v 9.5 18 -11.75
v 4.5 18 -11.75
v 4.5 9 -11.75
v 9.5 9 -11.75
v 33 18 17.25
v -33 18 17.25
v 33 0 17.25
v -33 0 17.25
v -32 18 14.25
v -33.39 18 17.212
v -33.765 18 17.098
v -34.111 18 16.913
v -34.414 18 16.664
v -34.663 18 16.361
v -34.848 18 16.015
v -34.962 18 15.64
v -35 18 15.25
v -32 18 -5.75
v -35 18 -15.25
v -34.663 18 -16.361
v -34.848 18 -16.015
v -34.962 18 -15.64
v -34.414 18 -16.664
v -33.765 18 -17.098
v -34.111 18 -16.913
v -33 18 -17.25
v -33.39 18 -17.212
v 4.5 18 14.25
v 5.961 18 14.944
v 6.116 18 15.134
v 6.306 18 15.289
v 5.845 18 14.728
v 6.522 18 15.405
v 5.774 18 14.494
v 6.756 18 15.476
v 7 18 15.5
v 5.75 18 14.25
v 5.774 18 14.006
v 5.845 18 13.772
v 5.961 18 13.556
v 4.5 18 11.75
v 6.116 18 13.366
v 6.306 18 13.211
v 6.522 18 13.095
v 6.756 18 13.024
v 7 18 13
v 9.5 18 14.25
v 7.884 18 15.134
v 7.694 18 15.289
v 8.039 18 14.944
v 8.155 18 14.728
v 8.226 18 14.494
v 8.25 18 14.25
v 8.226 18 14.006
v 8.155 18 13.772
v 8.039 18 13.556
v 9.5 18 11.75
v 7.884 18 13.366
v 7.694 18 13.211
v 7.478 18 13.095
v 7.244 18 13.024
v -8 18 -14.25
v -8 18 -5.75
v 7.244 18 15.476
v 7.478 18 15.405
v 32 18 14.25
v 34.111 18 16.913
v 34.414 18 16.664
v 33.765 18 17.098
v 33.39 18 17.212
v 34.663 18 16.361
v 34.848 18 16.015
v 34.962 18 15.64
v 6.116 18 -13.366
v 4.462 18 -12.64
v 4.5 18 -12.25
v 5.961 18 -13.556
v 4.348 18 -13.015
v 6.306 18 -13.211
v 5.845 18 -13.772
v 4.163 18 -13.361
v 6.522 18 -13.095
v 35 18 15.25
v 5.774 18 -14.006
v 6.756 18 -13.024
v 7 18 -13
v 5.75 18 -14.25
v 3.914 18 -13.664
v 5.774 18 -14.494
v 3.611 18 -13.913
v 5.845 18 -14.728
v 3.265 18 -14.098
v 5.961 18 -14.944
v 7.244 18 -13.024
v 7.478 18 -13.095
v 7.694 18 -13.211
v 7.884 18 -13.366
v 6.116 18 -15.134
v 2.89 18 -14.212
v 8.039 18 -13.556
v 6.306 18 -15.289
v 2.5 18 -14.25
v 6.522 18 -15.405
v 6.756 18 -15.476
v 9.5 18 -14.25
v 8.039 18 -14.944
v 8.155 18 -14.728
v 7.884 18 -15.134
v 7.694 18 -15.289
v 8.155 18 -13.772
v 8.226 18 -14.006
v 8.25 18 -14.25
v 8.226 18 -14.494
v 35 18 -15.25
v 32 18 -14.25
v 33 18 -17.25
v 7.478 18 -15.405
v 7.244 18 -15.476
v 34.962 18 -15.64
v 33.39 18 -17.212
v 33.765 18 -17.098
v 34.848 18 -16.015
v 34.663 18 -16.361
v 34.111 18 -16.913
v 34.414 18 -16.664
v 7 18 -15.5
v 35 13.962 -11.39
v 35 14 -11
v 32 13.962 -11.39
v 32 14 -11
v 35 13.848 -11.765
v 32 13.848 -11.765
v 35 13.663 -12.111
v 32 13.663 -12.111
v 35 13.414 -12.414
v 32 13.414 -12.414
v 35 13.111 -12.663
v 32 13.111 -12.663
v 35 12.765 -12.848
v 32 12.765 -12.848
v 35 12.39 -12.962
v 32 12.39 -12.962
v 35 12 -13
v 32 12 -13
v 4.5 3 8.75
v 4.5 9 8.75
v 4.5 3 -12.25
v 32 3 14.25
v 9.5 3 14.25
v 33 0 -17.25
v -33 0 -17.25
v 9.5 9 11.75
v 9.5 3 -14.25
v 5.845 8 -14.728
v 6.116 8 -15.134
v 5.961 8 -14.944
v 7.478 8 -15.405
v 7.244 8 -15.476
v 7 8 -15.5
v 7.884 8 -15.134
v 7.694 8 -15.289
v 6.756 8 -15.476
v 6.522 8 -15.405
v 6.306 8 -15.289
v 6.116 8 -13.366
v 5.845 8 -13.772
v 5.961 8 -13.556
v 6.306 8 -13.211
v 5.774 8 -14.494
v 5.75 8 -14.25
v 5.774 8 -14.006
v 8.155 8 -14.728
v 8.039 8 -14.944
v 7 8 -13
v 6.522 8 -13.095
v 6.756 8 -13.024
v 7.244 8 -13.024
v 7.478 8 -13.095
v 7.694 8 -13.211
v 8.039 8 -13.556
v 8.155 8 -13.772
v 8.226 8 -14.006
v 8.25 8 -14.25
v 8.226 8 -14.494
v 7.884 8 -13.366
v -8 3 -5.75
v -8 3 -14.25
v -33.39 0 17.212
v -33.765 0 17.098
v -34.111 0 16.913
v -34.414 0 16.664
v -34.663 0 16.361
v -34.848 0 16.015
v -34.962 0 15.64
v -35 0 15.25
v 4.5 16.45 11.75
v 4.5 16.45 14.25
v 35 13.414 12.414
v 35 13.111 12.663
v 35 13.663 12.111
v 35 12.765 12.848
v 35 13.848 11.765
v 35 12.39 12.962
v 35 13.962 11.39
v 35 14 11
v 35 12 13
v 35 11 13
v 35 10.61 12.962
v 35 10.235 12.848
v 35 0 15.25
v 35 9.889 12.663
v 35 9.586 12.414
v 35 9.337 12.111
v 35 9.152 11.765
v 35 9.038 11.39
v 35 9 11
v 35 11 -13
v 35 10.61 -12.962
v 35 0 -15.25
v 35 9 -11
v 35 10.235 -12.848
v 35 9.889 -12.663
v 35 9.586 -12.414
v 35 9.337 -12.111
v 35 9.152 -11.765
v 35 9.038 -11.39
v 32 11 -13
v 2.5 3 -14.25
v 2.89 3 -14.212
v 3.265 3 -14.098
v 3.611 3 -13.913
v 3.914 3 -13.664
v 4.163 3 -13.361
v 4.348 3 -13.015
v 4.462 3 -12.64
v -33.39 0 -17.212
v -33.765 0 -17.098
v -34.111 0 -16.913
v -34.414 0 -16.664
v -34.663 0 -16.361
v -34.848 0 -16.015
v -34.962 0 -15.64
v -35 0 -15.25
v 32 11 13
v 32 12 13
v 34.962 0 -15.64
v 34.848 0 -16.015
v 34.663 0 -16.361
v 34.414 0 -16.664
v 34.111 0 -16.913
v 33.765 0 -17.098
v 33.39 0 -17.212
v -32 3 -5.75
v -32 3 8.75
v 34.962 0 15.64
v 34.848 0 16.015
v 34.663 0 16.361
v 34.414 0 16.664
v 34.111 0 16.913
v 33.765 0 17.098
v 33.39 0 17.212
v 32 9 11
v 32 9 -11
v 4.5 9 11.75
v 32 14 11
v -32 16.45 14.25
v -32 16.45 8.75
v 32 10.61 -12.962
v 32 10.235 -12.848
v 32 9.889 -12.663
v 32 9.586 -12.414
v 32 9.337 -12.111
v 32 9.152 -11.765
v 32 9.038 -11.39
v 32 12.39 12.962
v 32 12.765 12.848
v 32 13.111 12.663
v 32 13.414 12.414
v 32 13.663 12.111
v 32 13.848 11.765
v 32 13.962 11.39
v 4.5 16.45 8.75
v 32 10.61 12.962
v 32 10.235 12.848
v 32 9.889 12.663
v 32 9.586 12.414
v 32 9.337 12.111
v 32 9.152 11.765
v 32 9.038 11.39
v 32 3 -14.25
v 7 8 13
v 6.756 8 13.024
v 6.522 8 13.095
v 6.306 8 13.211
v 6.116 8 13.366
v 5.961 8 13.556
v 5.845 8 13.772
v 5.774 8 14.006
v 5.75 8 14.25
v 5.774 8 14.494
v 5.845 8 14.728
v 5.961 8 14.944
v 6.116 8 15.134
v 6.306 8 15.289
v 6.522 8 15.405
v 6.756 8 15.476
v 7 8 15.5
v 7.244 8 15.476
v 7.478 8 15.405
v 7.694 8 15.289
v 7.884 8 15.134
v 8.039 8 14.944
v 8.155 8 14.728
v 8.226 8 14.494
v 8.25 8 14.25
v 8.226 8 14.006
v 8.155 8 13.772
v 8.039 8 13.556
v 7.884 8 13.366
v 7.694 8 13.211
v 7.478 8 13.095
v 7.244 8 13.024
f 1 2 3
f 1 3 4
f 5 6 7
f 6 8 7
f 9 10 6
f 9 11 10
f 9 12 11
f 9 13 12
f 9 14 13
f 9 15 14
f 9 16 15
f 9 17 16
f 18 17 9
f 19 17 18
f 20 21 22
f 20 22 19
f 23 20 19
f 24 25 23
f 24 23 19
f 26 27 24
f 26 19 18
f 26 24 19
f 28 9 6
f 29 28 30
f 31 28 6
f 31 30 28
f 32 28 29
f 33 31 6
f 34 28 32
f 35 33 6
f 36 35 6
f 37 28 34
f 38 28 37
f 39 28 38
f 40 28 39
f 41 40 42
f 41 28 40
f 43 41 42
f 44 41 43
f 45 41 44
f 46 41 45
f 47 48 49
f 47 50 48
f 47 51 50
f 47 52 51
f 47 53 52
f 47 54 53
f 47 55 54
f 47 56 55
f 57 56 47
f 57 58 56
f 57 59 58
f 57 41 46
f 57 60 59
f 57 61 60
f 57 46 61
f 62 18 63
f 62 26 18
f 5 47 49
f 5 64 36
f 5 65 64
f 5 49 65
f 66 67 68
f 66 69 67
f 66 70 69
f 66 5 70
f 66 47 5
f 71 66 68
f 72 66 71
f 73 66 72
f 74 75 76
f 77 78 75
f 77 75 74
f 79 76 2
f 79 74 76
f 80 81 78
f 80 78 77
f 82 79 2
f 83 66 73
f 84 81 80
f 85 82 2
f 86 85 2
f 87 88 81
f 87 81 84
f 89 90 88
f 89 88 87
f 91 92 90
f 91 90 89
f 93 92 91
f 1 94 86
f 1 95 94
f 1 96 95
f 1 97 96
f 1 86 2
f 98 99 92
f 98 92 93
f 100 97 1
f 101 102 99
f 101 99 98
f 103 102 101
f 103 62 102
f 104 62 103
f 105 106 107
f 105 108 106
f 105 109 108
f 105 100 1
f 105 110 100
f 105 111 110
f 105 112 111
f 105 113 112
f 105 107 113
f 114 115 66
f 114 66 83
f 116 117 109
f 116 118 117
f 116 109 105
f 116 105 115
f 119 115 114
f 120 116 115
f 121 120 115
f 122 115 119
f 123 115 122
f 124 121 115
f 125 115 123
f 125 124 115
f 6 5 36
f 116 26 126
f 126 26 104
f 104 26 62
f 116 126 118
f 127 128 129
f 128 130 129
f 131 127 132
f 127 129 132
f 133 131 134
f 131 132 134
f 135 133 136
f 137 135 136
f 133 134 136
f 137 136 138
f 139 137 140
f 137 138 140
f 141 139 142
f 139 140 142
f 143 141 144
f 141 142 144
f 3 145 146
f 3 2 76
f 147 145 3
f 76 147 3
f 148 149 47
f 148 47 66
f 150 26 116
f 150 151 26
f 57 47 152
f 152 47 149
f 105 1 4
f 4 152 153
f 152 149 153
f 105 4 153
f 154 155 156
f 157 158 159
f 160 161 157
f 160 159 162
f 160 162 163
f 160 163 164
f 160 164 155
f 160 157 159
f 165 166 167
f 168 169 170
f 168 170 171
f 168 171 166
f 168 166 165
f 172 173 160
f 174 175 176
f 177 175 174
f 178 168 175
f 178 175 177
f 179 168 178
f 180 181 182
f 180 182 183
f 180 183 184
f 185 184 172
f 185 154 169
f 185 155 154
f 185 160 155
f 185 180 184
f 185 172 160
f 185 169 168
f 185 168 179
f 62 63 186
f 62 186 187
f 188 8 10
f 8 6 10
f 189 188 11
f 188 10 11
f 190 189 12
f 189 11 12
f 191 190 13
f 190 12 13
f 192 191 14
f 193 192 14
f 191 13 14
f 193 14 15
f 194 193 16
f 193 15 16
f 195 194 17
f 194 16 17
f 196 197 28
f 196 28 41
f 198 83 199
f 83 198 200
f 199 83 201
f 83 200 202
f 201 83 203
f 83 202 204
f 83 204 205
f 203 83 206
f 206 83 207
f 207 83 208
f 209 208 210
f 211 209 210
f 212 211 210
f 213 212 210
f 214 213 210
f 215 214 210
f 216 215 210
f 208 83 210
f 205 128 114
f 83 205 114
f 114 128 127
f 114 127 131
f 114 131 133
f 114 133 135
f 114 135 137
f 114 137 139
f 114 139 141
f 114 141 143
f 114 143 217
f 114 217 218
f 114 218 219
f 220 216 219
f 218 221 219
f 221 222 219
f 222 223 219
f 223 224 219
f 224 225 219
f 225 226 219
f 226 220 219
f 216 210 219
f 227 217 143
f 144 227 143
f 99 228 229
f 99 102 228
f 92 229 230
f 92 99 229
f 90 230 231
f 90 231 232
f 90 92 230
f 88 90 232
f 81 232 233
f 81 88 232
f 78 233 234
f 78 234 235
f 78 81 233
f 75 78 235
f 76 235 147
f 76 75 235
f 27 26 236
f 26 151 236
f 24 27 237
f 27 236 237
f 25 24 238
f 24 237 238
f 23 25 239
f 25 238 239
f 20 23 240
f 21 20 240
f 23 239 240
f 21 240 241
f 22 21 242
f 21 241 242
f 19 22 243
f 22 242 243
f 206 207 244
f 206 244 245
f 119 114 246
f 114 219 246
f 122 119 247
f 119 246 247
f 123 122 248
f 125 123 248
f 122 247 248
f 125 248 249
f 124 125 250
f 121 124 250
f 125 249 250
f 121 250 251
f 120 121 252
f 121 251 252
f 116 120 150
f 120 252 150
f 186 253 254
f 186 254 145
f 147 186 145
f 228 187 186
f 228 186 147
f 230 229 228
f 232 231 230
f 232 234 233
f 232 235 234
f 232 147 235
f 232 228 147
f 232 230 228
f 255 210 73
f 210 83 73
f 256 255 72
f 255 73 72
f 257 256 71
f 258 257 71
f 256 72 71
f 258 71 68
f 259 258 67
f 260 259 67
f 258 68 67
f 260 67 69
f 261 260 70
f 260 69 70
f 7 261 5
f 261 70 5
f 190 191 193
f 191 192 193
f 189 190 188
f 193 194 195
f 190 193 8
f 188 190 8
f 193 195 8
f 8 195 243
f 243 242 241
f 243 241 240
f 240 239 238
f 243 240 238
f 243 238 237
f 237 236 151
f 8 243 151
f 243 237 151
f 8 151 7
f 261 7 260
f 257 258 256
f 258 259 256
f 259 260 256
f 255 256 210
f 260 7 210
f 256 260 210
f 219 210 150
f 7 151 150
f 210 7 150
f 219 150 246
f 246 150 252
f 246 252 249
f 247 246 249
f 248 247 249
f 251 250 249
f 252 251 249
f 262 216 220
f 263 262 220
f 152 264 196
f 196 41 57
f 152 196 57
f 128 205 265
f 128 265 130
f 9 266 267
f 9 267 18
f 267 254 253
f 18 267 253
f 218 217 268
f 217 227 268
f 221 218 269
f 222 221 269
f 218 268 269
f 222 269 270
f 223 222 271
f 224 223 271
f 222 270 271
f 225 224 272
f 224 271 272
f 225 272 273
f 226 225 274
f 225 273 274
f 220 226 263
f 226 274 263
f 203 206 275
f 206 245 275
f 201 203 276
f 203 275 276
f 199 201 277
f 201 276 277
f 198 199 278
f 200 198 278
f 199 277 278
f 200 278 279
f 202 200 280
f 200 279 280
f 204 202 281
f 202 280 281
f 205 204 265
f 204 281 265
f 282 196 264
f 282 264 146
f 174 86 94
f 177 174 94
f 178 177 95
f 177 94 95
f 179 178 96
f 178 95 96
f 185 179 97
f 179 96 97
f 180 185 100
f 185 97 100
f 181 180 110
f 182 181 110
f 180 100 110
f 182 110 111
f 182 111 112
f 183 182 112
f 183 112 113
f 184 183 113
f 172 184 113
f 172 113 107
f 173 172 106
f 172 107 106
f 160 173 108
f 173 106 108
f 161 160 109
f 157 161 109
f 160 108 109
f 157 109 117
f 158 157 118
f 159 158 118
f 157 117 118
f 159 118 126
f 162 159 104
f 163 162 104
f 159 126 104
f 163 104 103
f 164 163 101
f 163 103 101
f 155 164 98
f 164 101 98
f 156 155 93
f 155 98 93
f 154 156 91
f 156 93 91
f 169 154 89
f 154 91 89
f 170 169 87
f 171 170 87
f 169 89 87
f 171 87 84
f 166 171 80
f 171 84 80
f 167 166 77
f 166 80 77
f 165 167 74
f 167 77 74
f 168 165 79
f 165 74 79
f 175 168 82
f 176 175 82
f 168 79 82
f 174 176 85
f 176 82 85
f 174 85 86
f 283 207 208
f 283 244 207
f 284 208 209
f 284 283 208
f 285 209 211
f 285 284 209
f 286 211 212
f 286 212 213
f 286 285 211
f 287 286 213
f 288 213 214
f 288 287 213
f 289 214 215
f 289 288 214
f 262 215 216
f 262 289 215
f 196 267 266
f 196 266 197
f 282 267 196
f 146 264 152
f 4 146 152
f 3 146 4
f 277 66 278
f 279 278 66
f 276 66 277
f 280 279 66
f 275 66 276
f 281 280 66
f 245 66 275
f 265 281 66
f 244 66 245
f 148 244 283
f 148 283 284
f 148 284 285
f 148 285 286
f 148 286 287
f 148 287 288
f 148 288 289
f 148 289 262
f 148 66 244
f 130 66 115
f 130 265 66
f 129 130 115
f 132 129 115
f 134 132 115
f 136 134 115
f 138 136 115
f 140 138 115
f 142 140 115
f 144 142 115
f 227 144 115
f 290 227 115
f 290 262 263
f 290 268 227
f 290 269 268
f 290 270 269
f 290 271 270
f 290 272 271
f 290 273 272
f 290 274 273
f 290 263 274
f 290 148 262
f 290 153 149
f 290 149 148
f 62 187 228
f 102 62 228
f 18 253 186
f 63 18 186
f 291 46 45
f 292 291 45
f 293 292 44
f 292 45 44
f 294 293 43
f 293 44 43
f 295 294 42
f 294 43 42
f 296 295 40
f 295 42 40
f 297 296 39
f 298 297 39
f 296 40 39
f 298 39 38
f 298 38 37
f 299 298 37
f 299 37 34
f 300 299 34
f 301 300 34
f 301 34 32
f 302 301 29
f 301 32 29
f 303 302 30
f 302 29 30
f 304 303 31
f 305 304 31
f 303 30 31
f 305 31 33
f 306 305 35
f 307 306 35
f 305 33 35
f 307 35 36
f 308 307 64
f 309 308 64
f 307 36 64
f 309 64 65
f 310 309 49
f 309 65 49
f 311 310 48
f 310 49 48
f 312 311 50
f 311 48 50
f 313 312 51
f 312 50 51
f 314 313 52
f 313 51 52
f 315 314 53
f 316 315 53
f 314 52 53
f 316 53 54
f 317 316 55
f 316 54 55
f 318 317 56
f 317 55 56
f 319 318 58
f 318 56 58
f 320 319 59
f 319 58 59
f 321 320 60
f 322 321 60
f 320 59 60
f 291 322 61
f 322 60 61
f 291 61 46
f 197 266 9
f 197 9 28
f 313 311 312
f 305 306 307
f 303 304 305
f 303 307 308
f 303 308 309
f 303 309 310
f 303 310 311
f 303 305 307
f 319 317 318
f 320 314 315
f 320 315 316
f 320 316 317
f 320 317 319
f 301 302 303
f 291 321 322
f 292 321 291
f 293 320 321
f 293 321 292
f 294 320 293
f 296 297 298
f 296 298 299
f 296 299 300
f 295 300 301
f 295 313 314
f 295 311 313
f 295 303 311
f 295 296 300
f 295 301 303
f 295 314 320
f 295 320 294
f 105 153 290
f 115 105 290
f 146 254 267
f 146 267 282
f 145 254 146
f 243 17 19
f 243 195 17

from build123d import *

# Parameters (mm, degrees)
SKETCH1_W           = 70
SKETCH1_H           = 34.5
BOSS_EXTRUDE1_DEPTH = 3
SKETCH2_W           = 70
SKETCH2_H           = 34.5
SKETCH2_W_2         = 64
SKETCH2_H_2         = 28.5
EXTRUDE_THIN1_DEPTH = 15
CUT_EXTRUDE1_REACH  = 76.307
SKETCH3_W           = 26
SKETCH3_H           = 5
SKETCH6_W           = 5
SKETCH6_H           = 28.5
BOSS_EXTRUDE2_DEPTH = 15
SKETCH7_W           = 24
SKETCH7_H           = 8.5
BOSS_EXTRUDE3_DEPTH = 15
SKETCH8_W           = 36.5
SKETCH8_H           = 5.5
BOSS_EXTRUDE4_DEPTH = 13.45
FILLET1_R           = 2
FILLET2_R           = 2
CUT_EXTRUDE6_REACH  = 44.972
SKETCH12_W          = 5
SKETCH12_H          = 23.5
SKETCH13_R          = 1.25
CUT_EXTRUDE7_DEPTH  = 10
FILLET4_R           = 2


with BuildPart() as part:
    # Sketch1 → Boss-Extrude1 (new body)
    with BuildSketch(Plane(origin=(0, 0, 0), x_dir=(1, 0, 0), z_dir=(0, 1, 0))):
        Rectangle(SKETCH1_W, SKETCH1_H)
    extrude(amount=BOSS_EXTRUDE1_DEPTH)

    # Sketch2 → Extrude-Thin1 (add)
    with BuildSketch(Plane(origin=(0, 3, 0), x_dir=(1, 0, 0), z_dir=(0, 1, 0))):
        Rectangle(SKETCH2_W, SKETCH2_H)
        Rectangle(SKETCH2_W_2, SKETCH2_H_2, mode=Mode.SUBTRACT)
    extrude(amount=EXTRUDE_THIN1_DEPTH)

    # Sketch3 → Cut-Extrude1 (cut, up to next)
    with BuildSketch(Plane(origin=(35, 0, 0), x_dir=(0, 0, -1), z_dir=(1, 0, 0)), mode=Mode.PRIVATE) as cut_extrude1_sk1:
        with Locations((0, 11.5)):
            Rectangle(SKETCH3_W, SKETCH3_H)
    cut_extrude1_tool1 = extrude(cut_extrude1_sk1.sketch, amount=-CUT_EXTRUDE1_REACH, mode=Mode.PRIVATE) & part.part
    add(cut_extrude1_tool1.solids().sort_by_distance((35, 11.5, 0))[0], mode=Mode.SUBTRACT)

    # Sketch6 → Boss-Extrude2 (add)
    with BuildSketch(Plane(origin=(0, 3, 0), x_dir=(1, 0, 0), z_dir=(0, 1, 0))):
        with Locations((7, 0)):
            Rectangle(SKETCH6_W, SKETCH6_H)
    extrude(amount=BOSS_EXTRUDE2_DEPTH)

    # Sketch7 → Boss-Extrude3 (add)
    with BuildSketch(Plane(origin=(0, 3, 0), x_dir=(1, 0, 0), z_dir=(0, 1, 0))):
        with Locations((-20, 10)):
            Rectangle(SKETCH7_W, SKETCH7_H)
    extrude(amount=BOSS_EXTRUDE3_DEPTH)

    # Sketch8 → Boss-Extrude4 (add)
    with BuildSketch(Plane(origin=(0, 3, 0), x_dir=(1, 0, 0), z_dir=(0, 1, 0))):
        with Locations((-13.75, -11.5)):
            Rectangle(SKETCH8_W, SKETCH8_H)
    extrude(amount=BOSS_EXTRUDE4_DEPTH)

    # Fillet1
    fillet1_edges = [part.edges().sort_by_distance(p)[0] for p in [
        (33.5, 9, 13),
        (33.5, 14, 13),
        (33.5, 14, -13),
        (33.5, 9, -13),
    ]]
    fillet(fillet1_edges, radius=FILLET1_R)

    # Fillet2
    fillet2_edges = [part.edges().sort_by_distance(p)[0] for p in [
        (35, 9, 17.25),
        (-35, 9, 17.25),
        (-35, 9, -17.25),
        (35, 9, -17.25),
    ]]
    fillet(fillet2_edges, radius=FILLET2_R)

    # Cut-Extrude6: up to this face of the body (flat: up to its plane)
    cut_extrude6_end = Plane(part.part.faces().sort_by_distance((33.5, 9, 0))[0])
    # Sketch12 → Cut-Extrude6 (cut, up to the picked face)
    with BuildSketch(Plane(origin=(0, 18, 0), x_dir=(1, 0, 0), z_dir=(0, 1, 0)), mode=Mode.PRIVATE) as cut_extrude6_sk1:
        with Locations((7, 0)):
            Rectangle(SKETCH12_W, SKETCH12_H)
    cut_extrude6_tool1 = split(extrude(cut_extrude6_sk1.sketch, amount=-CUT_EXTRUDE6_REACH, mode=Mode.PRIVATE), bisect_by=cut_extrude6_end, keep=Keep.BOTH, mode=Mode.PRIVATE)
    add(cut_extrude6_tool1.solids().sort_by(Axis((7, 18, 0), (0, -1, 0)))[0], mode=Mode.SUBTRACT)

    # Sketch13 → Cut-Extrude7 (cut)
    with BuildSketch(Plane(origin=(0, 18, 0), x_dir=(1, 0, 0), z_dir=(0, 1, 0))):
        with Locations(Location((7, 14.25, 0), (0, 0, 270))):
            Circle(SKETCH13_R)
        with Locations(Location((7, -14.25, 0), (0, 0, 90))):
            Circle(SKETCH13_R)
    extrude(amount=-CUT_EXTRUDE7_DEPTH, mode=Mode.SUBTRACT)

    # Fillet4
    fillet4_edges = [part.edges().sort_by_distance(p)[0] for p in [
        (4.5, 10.5, -14.25),
    ]]
    fillet(fillet4_edges, radius=FILLET4_R)


solid = part.part
